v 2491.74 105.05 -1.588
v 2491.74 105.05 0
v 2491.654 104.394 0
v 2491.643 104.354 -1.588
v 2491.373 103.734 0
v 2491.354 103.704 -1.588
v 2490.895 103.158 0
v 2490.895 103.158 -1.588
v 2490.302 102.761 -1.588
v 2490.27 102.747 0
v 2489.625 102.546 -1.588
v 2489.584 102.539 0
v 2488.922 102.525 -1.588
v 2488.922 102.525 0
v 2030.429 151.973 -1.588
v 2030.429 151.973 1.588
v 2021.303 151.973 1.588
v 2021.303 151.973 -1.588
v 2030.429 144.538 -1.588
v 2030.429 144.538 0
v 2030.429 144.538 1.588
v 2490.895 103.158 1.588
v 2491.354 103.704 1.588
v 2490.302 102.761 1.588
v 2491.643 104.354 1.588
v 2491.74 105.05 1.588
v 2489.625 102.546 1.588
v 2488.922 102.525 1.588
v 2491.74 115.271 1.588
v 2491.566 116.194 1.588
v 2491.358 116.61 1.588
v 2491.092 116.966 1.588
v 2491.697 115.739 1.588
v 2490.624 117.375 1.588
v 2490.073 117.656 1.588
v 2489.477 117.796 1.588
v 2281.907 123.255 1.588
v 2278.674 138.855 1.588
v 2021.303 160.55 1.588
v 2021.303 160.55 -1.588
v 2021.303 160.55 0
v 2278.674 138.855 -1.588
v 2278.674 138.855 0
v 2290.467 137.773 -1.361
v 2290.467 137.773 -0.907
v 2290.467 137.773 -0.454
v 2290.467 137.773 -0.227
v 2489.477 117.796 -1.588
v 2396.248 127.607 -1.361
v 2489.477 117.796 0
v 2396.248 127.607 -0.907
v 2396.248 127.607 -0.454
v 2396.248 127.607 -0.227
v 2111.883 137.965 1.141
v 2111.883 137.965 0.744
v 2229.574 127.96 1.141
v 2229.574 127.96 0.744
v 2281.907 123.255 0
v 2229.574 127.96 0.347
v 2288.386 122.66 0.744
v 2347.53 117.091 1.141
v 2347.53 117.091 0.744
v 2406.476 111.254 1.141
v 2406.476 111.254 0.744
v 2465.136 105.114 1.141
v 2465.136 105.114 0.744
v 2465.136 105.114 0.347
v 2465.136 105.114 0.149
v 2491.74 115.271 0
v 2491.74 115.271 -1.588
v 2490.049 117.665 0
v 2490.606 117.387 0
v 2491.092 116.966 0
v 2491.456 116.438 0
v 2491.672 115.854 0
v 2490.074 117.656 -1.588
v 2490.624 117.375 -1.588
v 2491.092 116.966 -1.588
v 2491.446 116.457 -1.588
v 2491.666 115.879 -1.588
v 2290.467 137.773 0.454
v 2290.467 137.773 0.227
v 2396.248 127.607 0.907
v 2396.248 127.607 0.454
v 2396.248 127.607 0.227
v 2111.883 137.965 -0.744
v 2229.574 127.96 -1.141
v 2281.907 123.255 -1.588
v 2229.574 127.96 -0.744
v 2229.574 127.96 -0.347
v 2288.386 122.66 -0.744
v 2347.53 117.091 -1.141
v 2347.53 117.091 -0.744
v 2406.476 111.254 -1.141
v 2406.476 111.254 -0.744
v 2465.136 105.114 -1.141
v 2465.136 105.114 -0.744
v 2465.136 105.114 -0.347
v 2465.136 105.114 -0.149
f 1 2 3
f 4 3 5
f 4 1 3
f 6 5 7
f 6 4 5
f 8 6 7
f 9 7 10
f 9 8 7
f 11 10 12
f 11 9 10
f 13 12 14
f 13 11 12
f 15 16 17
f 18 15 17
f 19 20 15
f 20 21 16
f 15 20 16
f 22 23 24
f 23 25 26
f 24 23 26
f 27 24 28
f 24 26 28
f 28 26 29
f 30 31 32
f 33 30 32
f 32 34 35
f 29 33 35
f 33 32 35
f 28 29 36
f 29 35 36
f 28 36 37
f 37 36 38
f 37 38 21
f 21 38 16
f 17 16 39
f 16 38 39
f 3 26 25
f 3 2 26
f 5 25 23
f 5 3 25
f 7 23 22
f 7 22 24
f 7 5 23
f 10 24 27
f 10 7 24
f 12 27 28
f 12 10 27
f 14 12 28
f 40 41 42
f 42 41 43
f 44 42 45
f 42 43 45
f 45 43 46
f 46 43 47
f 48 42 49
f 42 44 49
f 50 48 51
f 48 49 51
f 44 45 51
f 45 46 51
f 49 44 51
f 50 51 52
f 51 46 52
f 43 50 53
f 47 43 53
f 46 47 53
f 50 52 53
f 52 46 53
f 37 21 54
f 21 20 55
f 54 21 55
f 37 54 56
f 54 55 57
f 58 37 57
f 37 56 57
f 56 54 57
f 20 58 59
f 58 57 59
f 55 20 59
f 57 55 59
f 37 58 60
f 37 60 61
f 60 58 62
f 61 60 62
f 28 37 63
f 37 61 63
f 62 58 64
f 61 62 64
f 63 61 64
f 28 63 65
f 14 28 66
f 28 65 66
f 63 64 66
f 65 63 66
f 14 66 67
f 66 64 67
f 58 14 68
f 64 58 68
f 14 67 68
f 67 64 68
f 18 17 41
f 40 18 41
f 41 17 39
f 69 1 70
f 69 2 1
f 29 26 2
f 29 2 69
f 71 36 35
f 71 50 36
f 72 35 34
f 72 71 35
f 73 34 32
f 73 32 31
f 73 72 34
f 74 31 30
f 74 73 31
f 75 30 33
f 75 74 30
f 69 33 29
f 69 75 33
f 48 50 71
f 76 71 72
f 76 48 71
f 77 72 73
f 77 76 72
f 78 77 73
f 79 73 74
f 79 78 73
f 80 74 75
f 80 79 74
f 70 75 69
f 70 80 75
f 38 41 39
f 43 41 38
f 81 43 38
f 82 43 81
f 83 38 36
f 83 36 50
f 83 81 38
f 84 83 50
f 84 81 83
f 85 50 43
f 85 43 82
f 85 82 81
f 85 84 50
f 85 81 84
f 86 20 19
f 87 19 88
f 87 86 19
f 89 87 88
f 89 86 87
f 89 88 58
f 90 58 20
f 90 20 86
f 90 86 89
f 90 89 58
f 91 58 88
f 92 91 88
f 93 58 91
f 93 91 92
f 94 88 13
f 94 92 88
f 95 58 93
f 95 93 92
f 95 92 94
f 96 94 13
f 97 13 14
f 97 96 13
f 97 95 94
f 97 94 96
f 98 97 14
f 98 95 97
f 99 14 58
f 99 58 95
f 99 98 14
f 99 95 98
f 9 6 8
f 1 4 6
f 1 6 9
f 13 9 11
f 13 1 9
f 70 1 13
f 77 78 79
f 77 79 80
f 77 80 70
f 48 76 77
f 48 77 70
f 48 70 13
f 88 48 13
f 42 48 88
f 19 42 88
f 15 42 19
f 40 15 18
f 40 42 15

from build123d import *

# Parameters (mm, degrees)
BOSS_EXTRUDE1_DEPTH = 1.5875
FILLET1_R           = 2.54
CUT_EXTRUDE1_DEPTH  = 7.62


with BuildPart() as part:
    # Sketch2 → Boss-Extrude1 (new body, symmetric)
    with BuildSketch(Plane.XY):
        with BuildLine():
            add(Edge.make_bspline(
                [(825.5, 263.72872798), (833.004293944, 262.763036085), (840.535916247, 261.846014478), (848.126574562, 260.964164828), (892.90639318, 255.945629274), (937.686211733, 251.779150949), (973.452075064, 248.227669425), (1071.946672141, 239.051054038), (1170.441269319, 229.731506738), (1231.791940344, 224.503945813), (1324.899336146, 216.790627817), (1418.006730935, 209.040117978), (1449.742935921, 206.361809936), (1636.928606778, 190.521130342), (1824.114277635, 175.409157235), (1979.966947376, 164.299650253), (2156.268639429, 150.414433314), (2332.570330468, 133.857216402), (2354.212983157, 131.78508222), (2394.341467798, 127.847039259), (2434.469952439, 123.717187755), (2453.57670361, 121.704562273), (2472.669581058, 119.647220503), (2491.74, 117.547195763)],
                knots=[78.681340958, 78.681340958, 78.681340958, 78.681340958, 78.681340958, 78.681340958, 82.46579272, 82.46579272, 82.46579272, 100.7932901, 100.7932901, 100.7932901, 131.0989539, 131.0989539, 131.0989539, 146.7691983, 146.7691983, 146.7691983, 223.5339586, 223.5339586, 223.5339586, 233.9431167, 233.9431167, 233.9431167, 243.40815085, 243.40815085, 243.40815085, 243.40815085, 243.40815085, 243.40815085], degree=5))
            Line((825.5, 263.72872798), (825.5, 248.364439806))
            add(Edge.make_bspline(
                [(825.5, 248.364439806), (827.20768691, 248.14708351), (833.784664511, 247.321927102), (845.28106727, 245.953419483), (860.086531547, 244.295598067), (879.830703434, 242.186646028), (904.369967092, 239.698279806), (933.571022669, 236.832150625), (962.642718041, 234.023667741), (991.762593943, 231.241975908), (1021.072010315, 228.475862291), (1060.376437315, 224.796956681), (1109.513015577, 220.184378862), (1168.511190361, 214.817071985), (1227.500129793, 209.662054042), (1306.133167947, 203.021178328), (1404.361477105, 194.920725932), (1522.239851071, 184.918066624), (1640.182856491, 175.167007786), (1758.165352567, 165.757639485), (1876.155384769, 156.590937079), (1994.08749188, 147.453250142), (2092.268692061, 139.624216053), (2170.748029042, 133.079656729), (2219.771730977, 128.842227836), (2258.983988247, 125.347211495), (2288.379457536, 122.670854497), (2317.812243116, 119.931729386), (2347.551509172, 117.100365283), (2377.159899727, 114.21011853), (2406.469653851, 111.26896801), (2435.81832606, 108.240091266), (2464.242715806, 105.222889554), (2482.876892709, 103.192325927), (2491.74, 102.214848055)],
                knots=[78.875303138, 78.875303138, 78.875303138, 78.875303138, 79.386176103, 80.841530691, 82.29688528, 83.752239868, 86.662949044, 89.57365822, 92.484367397, 95.395076573, 98.305785749, 101.216494926, 107.037913278, 112.859331631, 118.680749984, 124.502168336, 136.145005042, 147.787841747, 159.430678452, 171.073515158, 182.716351863, 194.359188568, 206.002025273, 211.823443626, 217.644861979, 220.555571155, 223.466280331, 226.376989508, 229.287698684, 232.19840786, 235.109117037, 238.019826213, 240.930535389, 243.57402126, 243.57402126, 243.57402126, 243.57402126], degree=3))
            Line((2491.74, 102.214848055), (2491.74, 117.547195763))
        make_face()
    extrude(amount=BOSS_EXTRUDE1_DEPTH, both=True)

    # Fillet1
    fillet1_edges = [part.edges().sort_by_distance(p)[0] for p in [
        (2491.74, 102.214848055, -0.79375),
        (2491.74, 117.547195763, -0.79375),
        (825.5, 248.364439806, -0.79375),
        (825.5, 263.72872798, 0.79375),
    ]]
    fillet(fillet1_edges, radius=FILLET1_R)

    # Sketch3 → Cut-Extrude1 (cut)
    with BuildSketch(Plane.XY.offset(1.5875)):
        Polygon((2021.302635877, 160.549539386), (2021.302635877, 169.900353667), (799.626603734, 282.38943621), (799.626603734, 218.449722533), (2030.428965883, 140.193570719), (2030.428965883, 144.537877355), (2030.428965883, 151.973195802), (2021.302635877, 151.973195802), align=None)
    extrude(amount=-CUT_EXTRUDE1_DEPTH, mode=Mode.SUBTRACT)


solid = part.part
